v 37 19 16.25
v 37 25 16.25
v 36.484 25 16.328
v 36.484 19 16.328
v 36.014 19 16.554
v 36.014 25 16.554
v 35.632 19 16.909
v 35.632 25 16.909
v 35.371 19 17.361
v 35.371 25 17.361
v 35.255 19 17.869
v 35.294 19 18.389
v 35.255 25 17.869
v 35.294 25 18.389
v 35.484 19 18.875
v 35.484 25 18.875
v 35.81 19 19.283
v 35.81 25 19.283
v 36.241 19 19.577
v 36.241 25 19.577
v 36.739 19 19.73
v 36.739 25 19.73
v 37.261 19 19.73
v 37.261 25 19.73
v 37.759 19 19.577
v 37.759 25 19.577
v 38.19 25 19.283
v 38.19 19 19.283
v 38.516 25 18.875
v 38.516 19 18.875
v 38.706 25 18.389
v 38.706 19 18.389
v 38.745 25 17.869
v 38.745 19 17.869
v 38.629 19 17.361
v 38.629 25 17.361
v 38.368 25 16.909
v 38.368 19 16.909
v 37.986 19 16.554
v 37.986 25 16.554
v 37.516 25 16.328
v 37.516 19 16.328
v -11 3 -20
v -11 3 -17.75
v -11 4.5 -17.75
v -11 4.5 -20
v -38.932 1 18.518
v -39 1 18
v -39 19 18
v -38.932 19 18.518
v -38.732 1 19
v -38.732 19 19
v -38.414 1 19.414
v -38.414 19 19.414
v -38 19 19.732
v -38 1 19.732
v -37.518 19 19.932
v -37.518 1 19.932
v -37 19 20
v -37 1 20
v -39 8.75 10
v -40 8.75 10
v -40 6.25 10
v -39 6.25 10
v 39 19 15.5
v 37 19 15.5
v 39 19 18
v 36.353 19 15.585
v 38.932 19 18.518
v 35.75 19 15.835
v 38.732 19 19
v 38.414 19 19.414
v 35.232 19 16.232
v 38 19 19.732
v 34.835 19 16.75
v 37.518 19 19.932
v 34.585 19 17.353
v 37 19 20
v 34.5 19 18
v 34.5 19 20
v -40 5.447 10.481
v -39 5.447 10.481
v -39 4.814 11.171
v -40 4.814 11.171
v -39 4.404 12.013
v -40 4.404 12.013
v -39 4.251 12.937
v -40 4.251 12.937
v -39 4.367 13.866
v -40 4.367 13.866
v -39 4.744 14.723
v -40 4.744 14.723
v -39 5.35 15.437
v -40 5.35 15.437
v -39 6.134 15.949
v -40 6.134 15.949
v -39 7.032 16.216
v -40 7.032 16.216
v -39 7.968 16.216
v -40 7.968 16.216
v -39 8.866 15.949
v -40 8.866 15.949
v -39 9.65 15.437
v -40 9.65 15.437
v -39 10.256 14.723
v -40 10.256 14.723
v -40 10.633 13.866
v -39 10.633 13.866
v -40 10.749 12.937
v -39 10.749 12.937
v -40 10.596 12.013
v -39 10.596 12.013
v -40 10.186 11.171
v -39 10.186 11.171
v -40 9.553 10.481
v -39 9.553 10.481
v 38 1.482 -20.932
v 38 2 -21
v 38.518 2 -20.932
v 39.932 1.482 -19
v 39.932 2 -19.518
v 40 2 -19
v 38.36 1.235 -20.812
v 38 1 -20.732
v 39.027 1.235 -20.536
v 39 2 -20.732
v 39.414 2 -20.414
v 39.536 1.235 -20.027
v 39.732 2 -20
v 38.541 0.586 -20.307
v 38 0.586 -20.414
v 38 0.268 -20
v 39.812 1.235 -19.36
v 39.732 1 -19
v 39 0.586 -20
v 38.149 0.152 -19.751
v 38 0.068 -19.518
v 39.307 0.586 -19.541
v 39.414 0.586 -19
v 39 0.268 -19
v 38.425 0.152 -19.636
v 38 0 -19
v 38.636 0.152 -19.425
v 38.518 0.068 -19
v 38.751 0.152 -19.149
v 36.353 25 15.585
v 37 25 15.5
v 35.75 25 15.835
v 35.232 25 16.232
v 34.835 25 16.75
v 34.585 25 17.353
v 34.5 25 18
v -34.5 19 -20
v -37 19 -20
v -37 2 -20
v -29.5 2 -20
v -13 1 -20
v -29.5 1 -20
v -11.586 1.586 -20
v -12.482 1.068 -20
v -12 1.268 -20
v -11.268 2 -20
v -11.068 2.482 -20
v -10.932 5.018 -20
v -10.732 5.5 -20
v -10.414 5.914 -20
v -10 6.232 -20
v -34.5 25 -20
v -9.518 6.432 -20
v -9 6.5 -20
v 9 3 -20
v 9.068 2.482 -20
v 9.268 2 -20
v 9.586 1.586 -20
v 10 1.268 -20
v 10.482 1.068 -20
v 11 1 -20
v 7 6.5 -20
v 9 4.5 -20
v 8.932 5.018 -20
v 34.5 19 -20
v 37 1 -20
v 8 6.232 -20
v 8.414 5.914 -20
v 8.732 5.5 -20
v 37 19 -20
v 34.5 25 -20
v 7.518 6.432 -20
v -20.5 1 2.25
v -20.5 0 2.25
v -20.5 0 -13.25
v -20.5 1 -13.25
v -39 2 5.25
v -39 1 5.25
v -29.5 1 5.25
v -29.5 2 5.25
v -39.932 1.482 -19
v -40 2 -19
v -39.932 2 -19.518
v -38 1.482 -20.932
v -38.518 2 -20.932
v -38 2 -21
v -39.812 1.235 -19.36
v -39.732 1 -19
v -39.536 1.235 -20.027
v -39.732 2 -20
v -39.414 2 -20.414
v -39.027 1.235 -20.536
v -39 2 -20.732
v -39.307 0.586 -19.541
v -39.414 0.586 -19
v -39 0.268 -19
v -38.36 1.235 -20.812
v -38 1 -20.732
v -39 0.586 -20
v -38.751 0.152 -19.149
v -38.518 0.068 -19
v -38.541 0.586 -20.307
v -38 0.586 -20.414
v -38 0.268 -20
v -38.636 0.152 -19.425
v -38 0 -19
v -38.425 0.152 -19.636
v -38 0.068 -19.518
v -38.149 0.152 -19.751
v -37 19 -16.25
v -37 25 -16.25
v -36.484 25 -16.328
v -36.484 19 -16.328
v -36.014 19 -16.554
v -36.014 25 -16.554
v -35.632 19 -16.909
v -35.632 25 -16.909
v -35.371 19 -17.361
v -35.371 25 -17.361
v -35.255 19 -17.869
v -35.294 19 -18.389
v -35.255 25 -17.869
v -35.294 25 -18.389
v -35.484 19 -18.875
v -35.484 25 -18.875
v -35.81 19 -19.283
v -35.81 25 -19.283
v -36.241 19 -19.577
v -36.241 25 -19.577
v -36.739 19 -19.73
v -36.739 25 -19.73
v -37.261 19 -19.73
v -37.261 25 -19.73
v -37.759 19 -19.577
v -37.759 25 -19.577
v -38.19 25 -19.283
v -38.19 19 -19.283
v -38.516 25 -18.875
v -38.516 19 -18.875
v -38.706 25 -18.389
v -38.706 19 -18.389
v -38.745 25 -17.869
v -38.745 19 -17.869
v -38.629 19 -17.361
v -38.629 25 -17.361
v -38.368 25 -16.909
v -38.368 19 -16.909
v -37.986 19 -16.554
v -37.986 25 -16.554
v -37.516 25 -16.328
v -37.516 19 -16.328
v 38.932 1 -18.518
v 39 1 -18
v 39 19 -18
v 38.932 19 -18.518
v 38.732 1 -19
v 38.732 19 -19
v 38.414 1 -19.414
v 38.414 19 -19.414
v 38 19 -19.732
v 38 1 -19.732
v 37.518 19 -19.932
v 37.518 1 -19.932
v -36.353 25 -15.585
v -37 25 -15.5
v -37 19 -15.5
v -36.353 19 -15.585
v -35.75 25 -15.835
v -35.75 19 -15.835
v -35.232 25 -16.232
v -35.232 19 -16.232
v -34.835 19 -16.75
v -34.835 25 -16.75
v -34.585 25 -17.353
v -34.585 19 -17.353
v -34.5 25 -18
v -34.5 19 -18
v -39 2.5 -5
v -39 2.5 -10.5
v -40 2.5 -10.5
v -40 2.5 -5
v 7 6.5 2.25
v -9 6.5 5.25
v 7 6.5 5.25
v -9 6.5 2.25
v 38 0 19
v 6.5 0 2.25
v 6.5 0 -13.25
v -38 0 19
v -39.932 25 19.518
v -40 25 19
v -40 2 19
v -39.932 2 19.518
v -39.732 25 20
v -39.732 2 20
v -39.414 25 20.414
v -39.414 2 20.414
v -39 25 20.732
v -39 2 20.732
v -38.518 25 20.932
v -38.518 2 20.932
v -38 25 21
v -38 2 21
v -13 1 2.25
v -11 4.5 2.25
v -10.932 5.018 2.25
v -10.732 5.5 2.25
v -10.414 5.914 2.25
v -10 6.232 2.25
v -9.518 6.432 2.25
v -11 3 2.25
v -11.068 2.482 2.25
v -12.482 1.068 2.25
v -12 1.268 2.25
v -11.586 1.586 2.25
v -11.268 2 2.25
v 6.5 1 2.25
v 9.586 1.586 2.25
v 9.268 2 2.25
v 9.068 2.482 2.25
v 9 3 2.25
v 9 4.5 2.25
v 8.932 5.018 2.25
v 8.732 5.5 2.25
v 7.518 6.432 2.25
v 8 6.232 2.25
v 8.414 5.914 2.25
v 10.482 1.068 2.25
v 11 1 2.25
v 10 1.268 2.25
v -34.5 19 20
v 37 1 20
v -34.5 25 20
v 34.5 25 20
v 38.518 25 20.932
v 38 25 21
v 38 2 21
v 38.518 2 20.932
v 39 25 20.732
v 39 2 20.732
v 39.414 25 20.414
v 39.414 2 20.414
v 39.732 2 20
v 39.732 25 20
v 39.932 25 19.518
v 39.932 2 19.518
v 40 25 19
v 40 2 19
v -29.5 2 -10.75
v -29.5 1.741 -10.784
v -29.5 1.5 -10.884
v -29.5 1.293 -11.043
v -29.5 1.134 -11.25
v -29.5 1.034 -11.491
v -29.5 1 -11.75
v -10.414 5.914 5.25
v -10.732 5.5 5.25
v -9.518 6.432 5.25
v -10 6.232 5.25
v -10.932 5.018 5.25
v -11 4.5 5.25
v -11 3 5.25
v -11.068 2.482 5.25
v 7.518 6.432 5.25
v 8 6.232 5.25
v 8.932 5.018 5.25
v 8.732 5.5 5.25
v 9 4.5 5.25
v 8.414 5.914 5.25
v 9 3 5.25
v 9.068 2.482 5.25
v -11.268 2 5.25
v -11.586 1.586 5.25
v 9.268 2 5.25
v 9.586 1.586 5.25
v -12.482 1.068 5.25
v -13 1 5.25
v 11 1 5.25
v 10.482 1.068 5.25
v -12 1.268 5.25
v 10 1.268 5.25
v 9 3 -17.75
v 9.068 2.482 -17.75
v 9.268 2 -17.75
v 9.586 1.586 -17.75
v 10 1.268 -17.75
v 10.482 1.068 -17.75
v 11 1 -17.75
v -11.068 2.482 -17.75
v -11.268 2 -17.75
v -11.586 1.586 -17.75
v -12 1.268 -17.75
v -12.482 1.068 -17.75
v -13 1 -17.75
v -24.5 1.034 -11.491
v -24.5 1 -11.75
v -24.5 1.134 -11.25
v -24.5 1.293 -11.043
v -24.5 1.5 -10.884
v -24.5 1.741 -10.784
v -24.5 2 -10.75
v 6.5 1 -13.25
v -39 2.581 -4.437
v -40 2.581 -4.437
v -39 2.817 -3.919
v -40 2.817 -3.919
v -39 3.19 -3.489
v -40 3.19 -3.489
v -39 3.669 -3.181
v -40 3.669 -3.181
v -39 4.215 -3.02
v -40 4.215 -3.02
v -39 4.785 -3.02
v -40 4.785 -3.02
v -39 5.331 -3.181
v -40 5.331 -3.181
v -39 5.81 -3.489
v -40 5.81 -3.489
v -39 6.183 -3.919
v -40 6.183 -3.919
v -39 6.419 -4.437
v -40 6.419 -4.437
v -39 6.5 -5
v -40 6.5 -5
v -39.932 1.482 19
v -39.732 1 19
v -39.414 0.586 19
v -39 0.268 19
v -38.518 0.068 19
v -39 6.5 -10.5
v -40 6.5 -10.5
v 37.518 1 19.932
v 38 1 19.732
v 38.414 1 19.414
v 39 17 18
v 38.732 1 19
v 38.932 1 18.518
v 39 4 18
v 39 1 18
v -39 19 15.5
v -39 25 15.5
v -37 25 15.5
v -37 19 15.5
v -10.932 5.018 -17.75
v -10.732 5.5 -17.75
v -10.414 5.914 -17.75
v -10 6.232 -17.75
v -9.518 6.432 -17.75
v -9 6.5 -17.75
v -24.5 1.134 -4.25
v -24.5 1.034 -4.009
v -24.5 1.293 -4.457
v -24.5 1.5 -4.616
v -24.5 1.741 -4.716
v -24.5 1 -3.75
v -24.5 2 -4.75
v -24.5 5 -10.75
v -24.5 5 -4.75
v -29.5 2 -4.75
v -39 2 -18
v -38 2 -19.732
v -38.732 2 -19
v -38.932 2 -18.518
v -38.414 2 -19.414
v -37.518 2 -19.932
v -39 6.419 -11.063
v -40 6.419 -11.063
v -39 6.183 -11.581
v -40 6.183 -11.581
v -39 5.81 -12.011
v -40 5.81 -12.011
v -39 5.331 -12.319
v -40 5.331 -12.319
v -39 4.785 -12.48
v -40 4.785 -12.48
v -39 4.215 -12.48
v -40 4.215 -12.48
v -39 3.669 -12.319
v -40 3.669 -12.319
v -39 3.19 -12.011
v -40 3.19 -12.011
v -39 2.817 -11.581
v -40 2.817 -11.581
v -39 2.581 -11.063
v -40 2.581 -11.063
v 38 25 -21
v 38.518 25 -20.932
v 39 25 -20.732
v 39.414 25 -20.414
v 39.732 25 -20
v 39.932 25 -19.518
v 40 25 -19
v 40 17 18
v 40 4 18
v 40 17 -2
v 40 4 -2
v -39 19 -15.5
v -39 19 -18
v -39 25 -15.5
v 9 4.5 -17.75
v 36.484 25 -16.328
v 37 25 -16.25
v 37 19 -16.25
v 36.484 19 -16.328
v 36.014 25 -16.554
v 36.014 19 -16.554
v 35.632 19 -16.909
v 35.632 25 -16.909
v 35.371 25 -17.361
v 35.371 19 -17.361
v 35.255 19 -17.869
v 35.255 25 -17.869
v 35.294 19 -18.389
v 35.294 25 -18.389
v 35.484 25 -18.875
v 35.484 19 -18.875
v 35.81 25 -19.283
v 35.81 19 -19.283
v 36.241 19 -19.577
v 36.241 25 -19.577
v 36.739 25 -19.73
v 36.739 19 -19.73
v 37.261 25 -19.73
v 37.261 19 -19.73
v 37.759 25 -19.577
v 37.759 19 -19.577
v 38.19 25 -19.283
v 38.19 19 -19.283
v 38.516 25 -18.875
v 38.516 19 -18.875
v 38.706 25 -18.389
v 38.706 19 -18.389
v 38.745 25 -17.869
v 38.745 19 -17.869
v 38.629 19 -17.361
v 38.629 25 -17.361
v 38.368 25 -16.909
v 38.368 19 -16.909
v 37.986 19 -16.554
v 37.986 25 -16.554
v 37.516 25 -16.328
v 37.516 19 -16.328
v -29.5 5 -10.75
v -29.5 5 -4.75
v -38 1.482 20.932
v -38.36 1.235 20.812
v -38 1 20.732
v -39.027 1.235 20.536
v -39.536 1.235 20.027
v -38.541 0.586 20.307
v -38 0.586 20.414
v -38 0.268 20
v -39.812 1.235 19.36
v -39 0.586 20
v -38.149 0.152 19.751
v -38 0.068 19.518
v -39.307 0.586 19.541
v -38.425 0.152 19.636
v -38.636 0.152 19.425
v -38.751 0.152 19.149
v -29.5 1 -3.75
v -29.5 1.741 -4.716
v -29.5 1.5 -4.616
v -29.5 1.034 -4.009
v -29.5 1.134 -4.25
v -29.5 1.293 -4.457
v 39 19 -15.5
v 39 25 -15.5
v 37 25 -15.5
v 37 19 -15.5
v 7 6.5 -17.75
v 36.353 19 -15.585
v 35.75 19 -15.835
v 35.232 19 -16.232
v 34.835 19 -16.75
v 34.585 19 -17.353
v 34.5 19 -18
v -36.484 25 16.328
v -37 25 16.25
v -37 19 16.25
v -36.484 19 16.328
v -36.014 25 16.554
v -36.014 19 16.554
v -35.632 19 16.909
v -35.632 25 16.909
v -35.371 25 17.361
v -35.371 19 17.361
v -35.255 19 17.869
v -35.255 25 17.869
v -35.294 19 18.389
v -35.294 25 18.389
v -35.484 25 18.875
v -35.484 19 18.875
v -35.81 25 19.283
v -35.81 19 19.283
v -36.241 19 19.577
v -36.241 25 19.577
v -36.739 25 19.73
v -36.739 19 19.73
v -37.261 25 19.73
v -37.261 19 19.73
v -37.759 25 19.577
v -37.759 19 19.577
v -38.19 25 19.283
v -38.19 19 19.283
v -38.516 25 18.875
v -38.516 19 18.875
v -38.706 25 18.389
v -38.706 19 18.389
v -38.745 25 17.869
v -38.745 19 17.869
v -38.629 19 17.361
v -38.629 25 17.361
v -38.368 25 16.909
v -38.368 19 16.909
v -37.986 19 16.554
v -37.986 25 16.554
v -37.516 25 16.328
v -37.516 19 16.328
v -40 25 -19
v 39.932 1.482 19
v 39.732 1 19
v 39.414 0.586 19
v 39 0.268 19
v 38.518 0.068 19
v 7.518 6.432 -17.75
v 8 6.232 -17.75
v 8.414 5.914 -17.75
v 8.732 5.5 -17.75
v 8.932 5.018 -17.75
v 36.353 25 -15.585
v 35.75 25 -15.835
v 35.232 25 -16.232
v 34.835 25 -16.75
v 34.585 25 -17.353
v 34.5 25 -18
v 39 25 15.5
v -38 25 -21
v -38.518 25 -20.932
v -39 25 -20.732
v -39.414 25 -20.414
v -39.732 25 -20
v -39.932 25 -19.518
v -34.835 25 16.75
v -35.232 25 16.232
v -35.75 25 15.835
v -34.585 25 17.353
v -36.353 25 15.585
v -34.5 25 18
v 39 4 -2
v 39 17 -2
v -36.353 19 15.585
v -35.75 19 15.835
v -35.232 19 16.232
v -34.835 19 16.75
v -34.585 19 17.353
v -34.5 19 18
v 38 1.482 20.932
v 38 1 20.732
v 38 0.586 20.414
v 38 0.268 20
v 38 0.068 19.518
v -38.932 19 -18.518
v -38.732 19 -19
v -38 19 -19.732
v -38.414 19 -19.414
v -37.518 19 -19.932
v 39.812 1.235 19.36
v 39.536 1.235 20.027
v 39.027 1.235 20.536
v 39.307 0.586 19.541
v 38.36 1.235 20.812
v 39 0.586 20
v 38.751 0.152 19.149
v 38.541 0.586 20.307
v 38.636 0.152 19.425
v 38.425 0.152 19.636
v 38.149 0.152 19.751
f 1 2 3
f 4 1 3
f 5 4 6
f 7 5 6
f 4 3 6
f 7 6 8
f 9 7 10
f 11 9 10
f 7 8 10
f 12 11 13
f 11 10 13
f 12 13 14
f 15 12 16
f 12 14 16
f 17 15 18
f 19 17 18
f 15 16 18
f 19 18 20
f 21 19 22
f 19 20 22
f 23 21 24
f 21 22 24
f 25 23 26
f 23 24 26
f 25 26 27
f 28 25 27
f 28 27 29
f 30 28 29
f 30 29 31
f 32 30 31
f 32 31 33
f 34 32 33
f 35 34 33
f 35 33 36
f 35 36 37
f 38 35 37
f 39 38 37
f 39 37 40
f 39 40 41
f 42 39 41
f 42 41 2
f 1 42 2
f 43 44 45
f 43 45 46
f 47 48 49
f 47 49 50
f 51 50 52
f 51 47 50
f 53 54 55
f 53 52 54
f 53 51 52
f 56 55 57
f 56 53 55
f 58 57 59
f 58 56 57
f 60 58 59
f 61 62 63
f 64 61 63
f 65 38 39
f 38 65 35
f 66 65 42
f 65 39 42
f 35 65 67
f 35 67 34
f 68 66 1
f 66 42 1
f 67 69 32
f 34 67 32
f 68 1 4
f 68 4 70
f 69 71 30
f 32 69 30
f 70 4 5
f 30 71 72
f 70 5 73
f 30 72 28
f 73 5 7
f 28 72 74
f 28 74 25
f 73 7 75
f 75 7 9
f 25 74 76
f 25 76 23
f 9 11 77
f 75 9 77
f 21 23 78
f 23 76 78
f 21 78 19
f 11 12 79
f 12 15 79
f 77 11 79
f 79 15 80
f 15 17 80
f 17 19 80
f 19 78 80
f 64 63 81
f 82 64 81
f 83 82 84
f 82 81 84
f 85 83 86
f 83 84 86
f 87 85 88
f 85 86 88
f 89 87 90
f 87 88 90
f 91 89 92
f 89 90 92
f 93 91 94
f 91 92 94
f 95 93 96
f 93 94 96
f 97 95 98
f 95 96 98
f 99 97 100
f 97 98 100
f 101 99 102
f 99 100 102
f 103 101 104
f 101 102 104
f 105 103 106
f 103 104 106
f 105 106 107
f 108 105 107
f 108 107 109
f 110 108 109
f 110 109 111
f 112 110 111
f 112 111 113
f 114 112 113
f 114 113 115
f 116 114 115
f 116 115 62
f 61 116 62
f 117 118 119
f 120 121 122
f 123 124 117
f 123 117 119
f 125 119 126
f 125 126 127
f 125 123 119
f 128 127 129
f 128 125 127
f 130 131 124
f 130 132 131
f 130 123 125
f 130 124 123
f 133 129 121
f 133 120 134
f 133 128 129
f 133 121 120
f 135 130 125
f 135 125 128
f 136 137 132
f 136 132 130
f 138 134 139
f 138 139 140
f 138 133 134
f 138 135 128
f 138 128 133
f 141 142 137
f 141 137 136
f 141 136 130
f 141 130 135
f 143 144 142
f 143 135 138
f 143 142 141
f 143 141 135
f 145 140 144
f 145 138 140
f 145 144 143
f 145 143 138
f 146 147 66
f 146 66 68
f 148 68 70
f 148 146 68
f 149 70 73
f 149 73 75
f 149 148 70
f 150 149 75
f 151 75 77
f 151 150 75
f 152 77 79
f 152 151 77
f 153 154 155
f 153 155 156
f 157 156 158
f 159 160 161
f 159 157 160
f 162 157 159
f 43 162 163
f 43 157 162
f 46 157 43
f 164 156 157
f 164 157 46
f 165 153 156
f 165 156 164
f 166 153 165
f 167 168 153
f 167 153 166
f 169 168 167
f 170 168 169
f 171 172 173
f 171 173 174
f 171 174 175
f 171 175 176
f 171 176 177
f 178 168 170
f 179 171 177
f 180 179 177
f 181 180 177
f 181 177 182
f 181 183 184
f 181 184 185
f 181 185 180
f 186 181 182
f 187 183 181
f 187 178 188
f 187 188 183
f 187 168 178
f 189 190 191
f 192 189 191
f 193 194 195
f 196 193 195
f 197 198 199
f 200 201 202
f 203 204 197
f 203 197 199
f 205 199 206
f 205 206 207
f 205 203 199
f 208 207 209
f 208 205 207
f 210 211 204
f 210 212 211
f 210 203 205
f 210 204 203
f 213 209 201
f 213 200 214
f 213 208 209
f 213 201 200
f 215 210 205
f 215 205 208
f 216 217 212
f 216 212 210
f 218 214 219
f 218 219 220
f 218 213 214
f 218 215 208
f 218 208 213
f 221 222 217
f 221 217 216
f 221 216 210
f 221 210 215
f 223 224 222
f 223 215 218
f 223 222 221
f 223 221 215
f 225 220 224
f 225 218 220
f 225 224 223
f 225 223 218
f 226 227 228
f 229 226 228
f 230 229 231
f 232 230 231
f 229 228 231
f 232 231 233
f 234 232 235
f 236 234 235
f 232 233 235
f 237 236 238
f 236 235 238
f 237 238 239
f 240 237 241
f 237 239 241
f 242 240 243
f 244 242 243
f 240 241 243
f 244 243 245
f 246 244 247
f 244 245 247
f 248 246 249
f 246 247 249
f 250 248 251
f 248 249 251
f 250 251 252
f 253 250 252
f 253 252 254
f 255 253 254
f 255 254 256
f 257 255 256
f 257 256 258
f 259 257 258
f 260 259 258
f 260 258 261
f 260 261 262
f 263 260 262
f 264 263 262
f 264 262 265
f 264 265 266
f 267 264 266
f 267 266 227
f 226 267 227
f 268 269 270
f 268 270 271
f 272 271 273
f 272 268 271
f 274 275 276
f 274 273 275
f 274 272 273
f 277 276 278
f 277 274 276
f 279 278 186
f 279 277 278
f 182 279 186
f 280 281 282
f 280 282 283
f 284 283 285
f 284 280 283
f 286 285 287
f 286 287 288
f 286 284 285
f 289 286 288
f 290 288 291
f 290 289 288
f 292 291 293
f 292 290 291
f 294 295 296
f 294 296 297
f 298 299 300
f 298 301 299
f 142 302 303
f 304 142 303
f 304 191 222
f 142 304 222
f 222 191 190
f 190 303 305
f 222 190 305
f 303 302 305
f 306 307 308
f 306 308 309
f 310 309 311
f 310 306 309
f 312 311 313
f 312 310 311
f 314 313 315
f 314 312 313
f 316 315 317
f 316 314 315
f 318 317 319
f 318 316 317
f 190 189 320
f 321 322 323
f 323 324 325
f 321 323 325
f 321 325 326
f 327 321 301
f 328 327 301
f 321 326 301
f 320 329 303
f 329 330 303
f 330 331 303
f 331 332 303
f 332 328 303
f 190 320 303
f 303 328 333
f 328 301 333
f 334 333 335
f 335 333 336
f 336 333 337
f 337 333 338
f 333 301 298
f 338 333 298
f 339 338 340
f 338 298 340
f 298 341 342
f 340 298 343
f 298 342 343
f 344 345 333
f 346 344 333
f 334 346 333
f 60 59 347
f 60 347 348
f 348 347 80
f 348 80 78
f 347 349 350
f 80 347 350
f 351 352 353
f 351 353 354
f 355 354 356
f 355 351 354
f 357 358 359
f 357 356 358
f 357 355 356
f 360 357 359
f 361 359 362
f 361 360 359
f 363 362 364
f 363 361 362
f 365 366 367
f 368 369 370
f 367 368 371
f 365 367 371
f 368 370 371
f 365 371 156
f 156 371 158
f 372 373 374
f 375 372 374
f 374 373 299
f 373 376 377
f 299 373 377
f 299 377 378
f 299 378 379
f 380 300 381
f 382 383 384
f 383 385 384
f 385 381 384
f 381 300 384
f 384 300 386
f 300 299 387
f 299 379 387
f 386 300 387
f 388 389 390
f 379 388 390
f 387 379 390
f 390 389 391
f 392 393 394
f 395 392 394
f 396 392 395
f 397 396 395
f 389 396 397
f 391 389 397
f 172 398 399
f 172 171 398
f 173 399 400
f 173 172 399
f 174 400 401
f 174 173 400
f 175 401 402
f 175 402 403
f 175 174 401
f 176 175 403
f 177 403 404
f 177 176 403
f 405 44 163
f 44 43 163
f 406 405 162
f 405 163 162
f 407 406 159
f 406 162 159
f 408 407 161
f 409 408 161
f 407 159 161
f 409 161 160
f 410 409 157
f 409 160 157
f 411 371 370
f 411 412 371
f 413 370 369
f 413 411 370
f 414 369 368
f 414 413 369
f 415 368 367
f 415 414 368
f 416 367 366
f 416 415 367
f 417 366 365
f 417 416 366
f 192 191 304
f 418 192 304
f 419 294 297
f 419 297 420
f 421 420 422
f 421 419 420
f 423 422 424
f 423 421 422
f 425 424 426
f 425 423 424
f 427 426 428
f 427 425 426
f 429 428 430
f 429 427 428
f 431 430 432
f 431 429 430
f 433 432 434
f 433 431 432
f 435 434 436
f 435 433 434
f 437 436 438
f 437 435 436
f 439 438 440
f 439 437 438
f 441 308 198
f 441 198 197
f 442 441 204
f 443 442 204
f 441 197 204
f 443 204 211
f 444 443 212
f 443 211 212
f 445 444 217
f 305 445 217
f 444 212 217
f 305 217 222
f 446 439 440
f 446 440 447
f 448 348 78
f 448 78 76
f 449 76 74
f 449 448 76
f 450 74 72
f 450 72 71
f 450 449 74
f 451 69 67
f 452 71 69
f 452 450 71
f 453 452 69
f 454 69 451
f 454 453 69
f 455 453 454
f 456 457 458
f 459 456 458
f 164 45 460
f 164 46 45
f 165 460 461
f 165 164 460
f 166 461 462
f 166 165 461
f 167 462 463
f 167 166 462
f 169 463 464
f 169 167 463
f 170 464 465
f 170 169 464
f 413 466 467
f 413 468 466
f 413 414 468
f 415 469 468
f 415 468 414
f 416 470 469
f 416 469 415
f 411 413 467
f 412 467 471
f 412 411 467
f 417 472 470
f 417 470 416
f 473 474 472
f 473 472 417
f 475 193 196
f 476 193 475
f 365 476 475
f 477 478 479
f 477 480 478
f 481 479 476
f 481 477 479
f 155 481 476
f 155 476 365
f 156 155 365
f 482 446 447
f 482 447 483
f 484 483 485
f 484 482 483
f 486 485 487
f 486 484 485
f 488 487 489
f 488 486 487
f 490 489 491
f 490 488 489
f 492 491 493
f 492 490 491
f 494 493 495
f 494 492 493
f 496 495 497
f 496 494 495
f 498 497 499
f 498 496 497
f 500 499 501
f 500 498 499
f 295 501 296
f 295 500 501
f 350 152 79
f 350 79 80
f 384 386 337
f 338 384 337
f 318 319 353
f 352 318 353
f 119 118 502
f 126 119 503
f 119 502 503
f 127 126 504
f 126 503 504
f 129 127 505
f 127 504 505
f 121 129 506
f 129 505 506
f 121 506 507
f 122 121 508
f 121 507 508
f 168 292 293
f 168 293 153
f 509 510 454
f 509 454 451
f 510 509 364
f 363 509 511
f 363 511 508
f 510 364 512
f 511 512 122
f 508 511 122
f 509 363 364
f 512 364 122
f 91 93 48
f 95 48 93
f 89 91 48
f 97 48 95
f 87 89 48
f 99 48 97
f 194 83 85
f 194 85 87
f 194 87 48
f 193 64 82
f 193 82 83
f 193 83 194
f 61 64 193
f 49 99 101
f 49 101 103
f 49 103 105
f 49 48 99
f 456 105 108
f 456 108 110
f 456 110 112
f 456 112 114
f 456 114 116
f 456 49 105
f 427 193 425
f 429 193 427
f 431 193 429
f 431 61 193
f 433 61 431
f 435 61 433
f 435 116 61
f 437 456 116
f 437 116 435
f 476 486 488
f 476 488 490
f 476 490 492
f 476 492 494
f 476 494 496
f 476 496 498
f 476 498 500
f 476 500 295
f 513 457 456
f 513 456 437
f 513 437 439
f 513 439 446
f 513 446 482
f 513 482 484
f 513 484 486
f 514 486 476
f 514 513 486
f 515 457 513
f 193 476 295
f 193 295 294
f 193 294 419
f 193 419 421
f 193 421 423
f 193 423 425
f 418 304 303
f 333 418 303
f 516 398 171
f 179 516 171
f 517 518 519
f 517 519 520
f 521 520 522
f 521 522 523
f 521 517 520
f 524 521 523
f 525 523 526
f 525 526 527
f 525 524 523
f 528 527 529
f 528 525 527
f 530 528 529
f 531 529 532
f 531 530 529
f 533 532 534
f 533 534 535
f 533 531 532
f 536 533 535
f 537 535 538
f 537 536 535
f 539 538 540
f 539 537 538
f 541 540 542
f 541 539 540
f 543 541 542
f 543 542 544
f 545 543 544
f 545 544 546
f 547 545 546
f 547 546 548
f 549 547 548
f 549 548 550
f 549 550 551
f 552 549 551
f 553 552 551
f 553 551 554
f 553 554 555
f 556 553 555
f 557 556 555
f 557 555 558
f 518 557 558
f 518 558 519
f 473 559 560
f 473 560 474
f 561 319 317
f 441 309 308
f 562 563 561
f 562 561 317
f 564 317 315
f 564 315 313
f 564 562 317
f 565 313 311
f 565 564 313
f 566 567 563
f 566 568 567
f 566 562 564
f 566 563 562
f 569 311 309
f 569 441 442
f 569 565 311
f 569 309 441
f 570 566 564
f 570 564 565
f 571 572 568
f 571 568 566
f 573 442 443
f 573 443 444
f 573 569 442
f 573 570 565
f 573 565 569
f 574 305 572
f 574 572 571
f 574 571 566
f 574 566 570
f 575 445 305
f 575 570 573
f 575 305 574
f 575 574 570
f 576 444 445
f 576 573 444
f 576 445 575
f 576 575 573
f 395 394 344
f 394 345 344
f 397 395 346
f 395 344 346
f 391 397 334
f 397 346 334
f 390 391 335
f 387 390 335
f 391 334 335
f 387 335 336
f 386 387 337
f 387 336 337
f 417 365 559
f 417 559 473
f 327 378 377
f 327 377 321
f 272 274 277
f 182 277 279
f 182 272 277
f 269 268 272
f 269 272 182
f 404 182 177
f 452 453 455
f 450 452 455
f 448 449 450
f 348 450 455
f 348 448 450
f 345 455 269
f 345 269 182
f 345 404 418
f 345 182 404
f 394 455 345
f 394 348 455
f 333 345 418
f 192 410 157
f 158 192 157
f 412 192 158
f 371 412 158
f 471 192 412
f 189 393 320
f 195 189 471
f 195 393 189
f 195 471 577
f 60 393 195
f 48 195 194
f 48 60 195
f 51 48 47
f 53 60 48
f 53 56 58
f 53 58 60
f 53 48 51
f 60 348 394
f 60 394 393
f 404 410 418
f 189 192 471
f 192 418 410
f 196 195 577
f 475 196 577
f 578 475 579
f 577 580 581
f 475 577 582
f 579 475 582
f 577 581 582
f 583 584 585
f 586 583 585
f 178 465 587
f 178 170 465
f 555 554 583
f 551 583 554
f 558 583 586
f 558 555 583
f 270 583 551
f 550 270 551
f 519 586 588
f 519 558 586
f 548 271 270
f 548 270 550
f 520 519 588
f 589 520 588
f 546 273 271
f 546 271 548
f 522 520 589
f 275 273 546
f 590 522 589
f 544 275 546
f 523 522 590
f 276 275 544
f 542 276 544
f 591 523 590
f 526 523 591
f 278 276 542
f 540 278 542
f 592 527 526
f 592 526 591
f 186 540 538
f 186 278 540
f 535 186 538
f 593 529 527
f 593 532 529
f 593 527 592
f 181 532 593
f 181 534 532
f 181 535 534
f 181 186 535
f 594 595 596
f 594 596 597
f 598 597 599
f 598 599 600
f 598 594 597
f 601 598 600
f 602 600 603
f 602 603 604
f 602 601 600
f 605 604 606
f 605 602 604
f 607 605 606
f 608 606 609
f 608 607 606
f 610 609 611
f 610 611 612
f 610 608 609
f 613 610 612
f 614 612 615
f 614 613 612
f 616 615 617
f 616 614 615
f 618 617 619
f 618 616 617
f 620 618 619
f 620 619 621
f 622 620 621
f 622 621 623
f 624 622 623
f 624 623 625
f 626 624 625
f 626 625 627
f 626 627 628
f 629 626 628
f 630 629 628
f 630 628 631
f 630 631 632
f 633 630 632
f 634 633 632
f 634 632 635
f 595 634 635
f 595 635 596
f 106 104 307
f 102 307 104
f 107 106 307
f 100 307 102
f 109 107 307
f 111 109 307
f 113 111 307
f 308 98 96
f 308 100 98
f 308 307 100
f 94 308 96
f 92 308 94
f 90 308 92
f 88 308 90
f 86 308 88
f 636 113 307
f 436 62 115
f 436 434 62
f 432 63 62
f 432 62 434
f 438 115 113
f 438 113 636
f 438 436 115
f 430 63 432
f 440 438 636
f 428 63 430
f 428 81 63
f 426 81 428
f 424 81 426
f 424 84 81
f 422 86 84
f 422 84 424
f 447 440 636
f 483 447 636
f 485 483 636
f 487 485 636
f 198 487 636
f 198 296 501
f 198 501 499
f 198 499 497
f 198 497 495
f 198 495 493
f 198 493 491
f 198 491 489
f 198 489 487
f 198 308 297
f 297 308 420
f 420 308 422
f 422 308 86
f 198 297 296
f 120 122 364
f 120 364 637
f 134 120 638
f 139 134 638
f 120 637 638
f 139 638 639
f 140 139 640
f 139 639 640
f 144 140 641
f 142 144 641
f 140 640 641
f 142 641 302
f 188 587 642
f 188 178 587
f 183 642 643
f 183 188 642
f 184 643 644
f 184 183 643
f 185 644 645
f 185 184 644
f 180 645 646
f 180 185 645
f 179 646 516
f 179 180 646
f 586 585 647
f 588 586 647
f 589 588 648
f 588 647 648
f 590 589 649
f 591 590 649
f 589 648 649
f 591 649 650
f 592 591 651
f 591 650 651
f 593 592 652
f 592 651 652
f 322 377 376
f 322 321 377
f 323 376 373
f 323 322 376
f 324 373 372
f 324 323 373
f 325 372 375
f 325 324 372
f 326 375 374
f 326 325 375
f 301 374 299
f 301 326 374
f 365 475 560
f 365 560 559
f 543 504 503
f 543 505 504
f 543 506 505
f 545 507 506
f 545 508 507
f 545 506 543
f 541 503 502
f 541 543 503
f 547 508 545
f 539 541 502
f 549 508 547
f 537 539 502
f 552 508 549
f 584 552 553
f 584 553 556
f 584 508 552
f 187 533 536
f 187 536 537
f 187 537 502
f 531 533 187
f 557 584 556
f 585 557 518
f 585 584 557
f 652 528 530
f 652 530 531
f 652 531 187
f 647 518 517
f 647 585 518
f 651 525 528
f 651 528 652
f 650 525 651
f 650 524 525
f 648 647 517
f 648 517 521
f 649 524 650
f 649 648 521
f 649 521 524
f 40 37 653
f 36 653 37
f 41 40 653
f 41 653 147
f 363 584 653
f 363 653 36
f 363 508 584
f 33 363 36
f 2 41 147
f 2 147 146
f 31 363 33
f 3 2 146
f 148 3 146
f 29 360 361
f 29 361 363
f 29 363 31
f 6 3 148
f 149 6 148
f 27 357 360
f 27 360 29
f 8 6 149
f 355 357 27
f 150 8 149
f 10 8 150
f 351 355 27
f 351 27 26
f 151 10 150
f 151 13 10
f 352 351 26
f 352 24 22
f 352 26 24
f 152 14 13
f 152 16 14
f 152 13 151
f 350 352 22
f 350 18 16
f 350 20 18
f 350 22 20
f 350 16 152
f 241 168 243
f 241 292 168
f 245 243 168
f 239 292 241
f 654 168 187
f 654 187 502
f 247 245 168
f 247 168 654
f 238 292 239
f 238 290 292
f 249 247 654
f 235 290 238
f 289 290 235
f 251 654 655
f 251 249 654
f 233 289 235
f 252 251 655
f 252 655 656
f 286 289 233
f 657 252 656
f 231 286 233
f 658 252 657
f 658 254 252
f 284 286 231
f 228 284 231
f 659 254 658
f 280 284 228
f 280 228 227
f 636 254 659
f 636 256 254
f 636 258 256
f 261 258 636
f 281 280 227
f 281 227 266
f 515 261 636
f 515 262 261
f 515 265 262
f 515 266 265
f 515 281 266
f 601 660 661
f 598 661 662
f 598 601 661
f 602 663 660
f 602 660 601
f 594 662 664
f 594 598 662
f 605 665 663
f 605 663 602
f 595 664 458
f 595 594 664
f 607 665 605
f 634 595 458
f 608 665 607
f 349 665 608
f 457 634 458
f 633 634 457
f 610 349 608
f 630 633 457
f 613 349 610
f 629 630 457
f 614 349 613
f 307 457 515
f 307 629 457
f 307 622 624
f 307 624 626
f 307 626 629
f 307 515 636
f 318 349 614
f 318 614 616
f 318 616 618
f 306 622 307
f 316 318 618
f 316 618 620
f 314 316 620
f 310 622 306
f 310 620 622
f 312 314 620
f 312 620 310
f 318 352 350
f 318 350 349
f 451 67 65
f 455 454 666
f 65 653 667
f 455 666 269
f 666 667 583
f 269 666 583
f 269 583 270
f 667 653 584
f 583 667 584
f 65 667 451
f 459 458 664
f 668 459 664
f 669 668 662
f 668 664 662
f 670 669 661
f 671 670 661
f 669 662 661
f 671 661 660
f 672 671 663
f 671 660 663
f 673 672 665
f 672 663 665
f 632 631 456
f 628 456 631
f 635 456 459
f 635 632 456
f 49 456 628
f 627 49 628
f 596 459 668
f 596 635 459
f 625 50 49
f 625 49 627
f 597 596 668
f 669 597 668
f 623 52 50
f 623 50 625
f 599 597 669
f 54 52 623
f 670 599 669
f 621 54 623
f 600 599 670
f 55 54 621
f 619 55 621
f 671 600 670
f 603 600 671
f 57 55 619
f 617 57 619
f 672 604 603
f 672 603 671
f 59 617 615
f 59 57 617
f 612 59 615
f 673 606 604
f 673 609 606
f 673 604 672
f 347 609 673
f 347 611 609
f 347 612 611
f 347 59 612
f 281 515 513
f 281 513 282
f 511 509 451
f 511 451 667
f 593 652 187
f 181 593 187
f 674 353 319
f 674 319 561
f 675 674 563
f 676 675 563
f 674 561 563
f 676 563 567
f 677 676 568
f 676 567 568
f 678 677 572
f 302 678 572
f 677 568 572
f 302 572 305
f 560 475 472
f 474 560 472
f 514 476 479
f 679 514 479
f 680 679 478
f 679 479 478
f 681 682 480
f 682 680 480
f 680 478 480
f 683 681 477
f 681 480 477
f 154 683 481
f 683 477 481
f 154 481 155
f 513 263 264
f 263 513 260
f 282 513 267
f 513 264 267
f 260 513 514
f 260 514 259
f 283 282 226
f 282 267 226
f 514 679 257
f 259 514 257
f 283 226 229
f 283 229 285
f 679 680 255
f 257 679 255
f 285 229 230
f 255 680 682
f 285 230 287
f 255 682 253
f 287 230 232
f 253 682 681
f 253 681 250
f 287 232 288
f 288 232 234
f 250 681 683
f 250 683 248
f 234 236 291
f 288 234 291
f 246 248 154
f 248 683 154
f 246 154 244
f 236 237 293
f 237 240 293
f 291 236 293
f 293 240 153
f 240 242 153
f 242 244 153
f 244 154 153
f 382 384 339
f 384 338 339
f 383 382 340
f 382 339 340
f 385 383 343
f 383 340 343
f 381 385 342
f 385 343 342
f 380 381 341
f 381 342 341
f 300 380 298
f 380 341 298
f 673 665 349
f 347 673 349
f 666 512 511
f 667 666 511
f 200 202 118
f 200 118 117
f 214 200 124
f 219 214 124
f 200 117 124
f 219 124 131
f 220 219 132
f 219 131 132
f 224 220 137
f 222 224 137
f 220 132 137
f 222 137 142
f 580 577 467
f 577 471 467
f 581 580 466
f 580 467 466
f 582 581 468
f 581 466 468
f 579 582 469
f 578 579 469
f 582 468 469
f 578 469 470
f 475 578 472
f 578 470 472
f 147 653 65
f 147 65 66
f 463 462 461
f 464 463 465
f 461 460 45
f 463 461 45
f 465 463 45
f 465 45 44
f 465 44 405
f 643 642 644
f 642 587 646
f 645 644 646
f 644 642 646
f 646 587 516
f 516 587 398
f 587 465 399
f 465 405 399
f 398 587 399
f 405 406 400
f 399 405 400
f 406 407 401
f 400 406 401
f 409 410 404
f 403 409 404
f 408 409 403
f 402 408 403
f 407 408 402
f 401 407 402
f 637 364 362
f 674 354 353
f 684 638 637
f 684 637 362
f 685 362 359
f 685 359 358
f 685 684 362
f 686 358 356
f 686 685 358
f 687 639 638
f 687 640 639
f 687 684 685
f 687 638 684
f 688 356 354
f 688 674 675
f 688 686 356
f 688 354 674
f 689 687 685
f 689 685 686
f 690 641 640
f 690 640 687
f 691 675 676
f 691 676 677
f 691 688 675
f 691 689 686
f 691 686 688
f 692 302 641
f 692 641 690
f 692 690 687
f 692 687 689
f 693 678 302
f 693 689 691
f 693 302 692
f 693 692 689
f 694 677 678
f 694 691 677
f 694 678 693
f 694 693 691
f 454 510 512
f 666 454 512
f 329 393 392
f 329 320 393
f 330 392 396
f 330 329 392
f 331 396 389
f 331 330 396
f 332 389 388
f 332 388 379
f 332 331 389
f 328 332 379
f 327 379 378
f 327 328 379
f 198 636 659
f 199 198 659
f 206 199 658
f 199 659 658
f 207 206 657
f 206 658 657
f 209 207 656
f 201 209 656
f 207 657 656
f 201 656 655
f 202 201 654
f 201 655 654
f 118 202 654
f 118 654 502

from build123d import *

# Parameters (mm, degrees)
SKETCH1_W               = 80
SKETCH1_H               = 42
BOSS_EXTRUDE1_DEPTH     = 25
SKETCH6_W               = 78
SKETCH6_H               = 40
CUT_EXTRUDE6_DEPTH      = 24
CUT_EXTRUDE7_REACH      = 53.157
SKETCH7_W               = 33.5
SKETCH7_H               = 20
SKETCH8_W               = 5
SKETCH8_H               = 6
BOSS_EXTRUDE2_DEPTH     = 4
SKETCH9_W               = 9.5
SKETCH9_H               = 25.25
BOSS_EXTRUDE3_DEPTH     = 1
FILLET1_R               = 1
FILLET3_R               = 2
CUT_EXTRUDE8_REACH      = 87.481
SKETCH18_W              = 20
SKETCH18_H              = 2.25
SKETCH18_H_2            = 3
BOSS_EXTRUDE5_DEPTH     = 5.5
FILLET5_R               = 2
CUT_EXTRUDE12_REACH     = 88.406
BOSS_EXTRUDE6_DEPTH     = 6
CUT_EXTRUDE13_REACH     = 53.633
SKETCH22_R              = 1.75
MIRROR3_COPY_1_DEPTH    = 6
MIRROR3_COPY_2_REACH    = 53.633
MIRROR3_COPY_2_SKETCH_R = 1.75
FILLET6_R               = 2
BOSS_EXTRUDE7_DEPTH     = 1
CUT_EXTRUDE14_REACH     = 88.406
SKETCH24_W              = 20
SKETCH24_H              = 13


with BuildPart() as part:
    # Sketch1 → Boss-Extrude1 (new body)
    with BuildSketch(Plane(origin=(0, 0, 0), x_dir=(1, 0, 0), z_dir=(0, 1, 0))):
        Rectangle(SKETCH1_W, SKETCH1_H)
    extrude(amount=BOSS_EXTRUDE1_DEPTH)

    # Sketch6 → Cut-Extrude6 (cut)
    with BuildSketch(Plane(origin=(0, 25, 0), x_dir=(1, 0, 0), z_dir=(0, 1, 0))):
        Rectangle(SKETCH6_W, SKETCH6_H)
    extrude(amount=-CUT_EXTRUDE6_DEPTH, mode=Mode.SUBTRACT)

    # Sketch7 → Cut-Extrude7 (cut, up to next)
    with BuildSketch(Plane(origin=(0, 1, 0), x_dir=(1, 0, 0), z_dir=(0, 1, 0)), mode=Mode.PRIVATE) as cut_extrude7_sk1:
        with Locations((-7.75, 7.75)):
            Rectangle(SKETCH7_W, SKETCH7_H)
    cut_extrude7_tool1 = extrude(cut_extrude7_sk1.sketch, amount=-CUT_EXTRUDE7_REACH, mode=Mode.PRIVATE) & part.part
    add(cut_extrude7_tool1.solids().sort_by_distance((-7.75, 1, -7.75))[0], mode=Mode.SUBTRACT)

    # Sketch8 → Boss-Extrude2 (add)
    with BuildSketch(Plane(origin=(0, 1, 0), x_dir=(1, 0, 0), z_dir=(0, 1, 0))):
        with Locations((-27, 7.75)):
            Rectangle(SKETCH8_W, SKETCH8_H)
    extrude(amount=BOSS_EXTRUDE2_DEPTH)

    # Sketch9 → Boss-Extrude3 (add)
    with BuildSketch(Plane(origin=(0, 1, 0), x_dir=(1, 0, 0), z_dir=(0, 1, 0))):
        with Locations((-34.25, 7.375)):
            Rectangle(SKETCH9_W, SKETCH9_H)
    extrude(amount=BOSS_EXTRUDE3_DEPTH)

    # Fillet1
    fillet1_edges = [part.edges().sort_by_distance(p)[0] for p in [
        (-27, 1, -10.75),
        (-27, 1, -4.75),
    ]]
    fillet(fillet1_edges, radius=FILLET1_R)

    # Fillet3
    fillet3_edges = [part.edges().sort_by_distance(p)[0] for p in [
        (-39, 13, 20),
        (39, 13, 20),
        (39, 13, -20),
        (-39, 13.5, -20),
        (40, 12.5, 21),
        (-40, 12.5, 21),
        (-40, 12.5, -21),
        (40, 12.5, -21),
    ]]
    fillet(fillet3_edges, radius=FILLET3_R)

    # Sketch12 → Cut-Extrude8 (cut, up to next)
    with BuildSketch(Plane(origin=(-39, 0, 0), x_dir=(0, 0, -1), z_dir=(1, 0, 0)), mode=Mode.PRIVATE) as cut_extrude8_sk1:
        with BuildLine():
            Line((5, 6.5), (10.5, 6.5))
            ThreePointArc((10.5, 6.5), (12.5, 4.5), (10.5, 2.5))
            Line((10.5, 2.5), (5, 2.5))
            ThreePointArc((5, 2.5), (3, 4.5), (5, 6.5))
        make_face()
    cut_extrude8_tool1 = extrude(cut_extrude8_sk1.sketch, amount=-CUT_EXTRUDE8_REACH, mode=Mode.PRIVATE) & part.part
    add(cut_extrude8_tool1.solids().sort_by_distance((-39, 4.5, -7.75))[0], mode=Mode.SUBTRACT)

    # Sketch18 → Boss-Extrude5 (add)
    with BuildSketch(Plane(origin=(0, 1, 0), x_dir=(1, 0, 0), z_dir=(0, 1, 0))):
        with Locations((-1, 18.875)):
            Rectangle(SKETCH18_W, SKETCH18_H)
        with Locations((-1, -3.75)):
            Rectangle(SKETCH18_W, SKETCH18_H_2)
    extrude(amount=BOSS_EXTRUDE5_DEPTH)

    # Fillet5
    fillet5_edges = [part.edges().sort_by_distance(p)[0] for p in [
        (9, 1, -18.875),
        (-11, 1, -18.875),
        (9, 6.5, -18.875),
        (-11, 6.5, -18.875),
        (9, 1, 3.75),
        (-11, 1, 3.75),
        (9, 6.5, 3.75),
        (-11, 6.5, 3.75),
    ]]
    fillet(fillet5_edges, radius=FILLET5_R)

    # Sketch19 → Cut-Extrude12 (cut, up to next)
    with BuildSketch(Plane.ZY.offset(40), mode=Mode.PRIVATE) as cut_extrude12_sk1:
        with BuildLine():
            Line((10, 8.75), (10, 6.25))
            ThreePointArc((10, 6.25), (16.25, 7.5), (10, 8.75))
        make_face()
    cut_extrude12_tool1 = extrude(cut_extrude12_sk1.sketch, amount=-CUT_EXTRUDE12_REACH, mode=Mode.PRIVATE) & part.part
    add(cut_extrude12_tool1.solids().sort_by_distance((-40, 7.5, 13.039742))[0], mode=Mode.SUBTRACT)

    # Sketch20 → Boss-Extrude6 (add)
    with BuildSketch(Plane(origin=(0, 25, 0), x_dir=(1, 0, 0), z_dir=(0, 1, 0))):
        with BuildLine():
            Line((-34.5, 20), (-37, 20))
            ThreePointArc((-37, 20), (-38.414213562, 19.414213562), (-39, 18))
            Line((-39, 18), (-39, 15.5))
            Line((-39, 15.5), (-37, 15.5))
            ThreePointArc((-37, 15.5), (-35.232233047, 16.232233047), (-34.5, 18))
            Line((-34.5, 18), (-34.5, 20))
        make_face()
    boss_extrude6 = extrude(amount=-BOSS_EXTRUDE6_DEPTH)

    # Sketch22 → Cut-Extrude13 (cut, up to next)
    with BuildSketch(Plane(origin=(0, 25, 0), x_dir=(1, 0, 0), z_dir=(0, 1, 0)), mode=Mode.PRIVATE) as cut_extrude13_sk1:
        with Locations(Location((-37, 18, 0), (0, 0, 270))):
            Circle(SKETCH22_R)
    cut_extrude13_tool1 = extrude(cut_extrude13_sk1.sketch, amount=-CUT_EXTRUDE13_REACH, mode=Mode.PRIVATE) & part.part
    cut_extrude13 = cut_extrude13_tool1.solids().sort_by_distance((-37, 25, -18))[0]
    add(cut_extrude13, mode=Mode.SUBTRACT)

    # Mirror1: Boss-Extrude6, Cut-Extrude13 across plane
    add(boss_extrude6.mirror(Plane.XY))
    add(cut_extrude13.mirror(Plane.XY), mode=Mode.SUBTRACT)

    # Mirror3: Boss-Extrude6, Cut-Extrude13 across plane
    add(boss_extrude6.mirror(Plane(origin=(0, 0, 0), x_dir=(0, 0, 1), z_dir=(1, 0, 0))))
    add(cut_extrude13.mirror(Plane(origin=(0, 0, 0), x_dir=(0, 0, 1), z_dir=(1, 0, 0))), mode=Mode.SUBTRACT)

    # Mirror3 copy 1 sketch → Mirror3 copy 1 (add)
    with BuildSketch(Plane(origin=(0, 25, 0), x_dir=(-1, 0, 0), z_dir=(0, 1, 0))):
        with BuildLine():
            Line((-34.5, 20), (-37, 20))
            ThreePointArc((-37, 20), (-38.414213562, 19.414213562), (-39, 18))
            Line((-39, 18), (-39, 15.5))
            Line((-39, 15.5), (-37, 15.5))
            ThreePointArc((-37, 15.5), (-35.232233047, 16.232233047), (-34.5, 18))
            Line((-34.5, 18), (-34.5, 20))
        make_face()
    extrude(amount=-MIRROR3_COPY_1_DEPTH)

    # Mirror3 copy 2 sketch → Mirror3 copy 2 (cut, up to next)
    with BuildSketch(Plane(origin=(0, 25, 0), x_dir=(-1, 0, 0), z_dir=(0, 1, 0)), mode=Mode.PRIVATE) as mirror3_copy_2_sk1:
        with Locations(Location((-37, 18, 0), (0, 0, 270))):
            Circle(MIRROR3_COPY_2_SKETCH_R)
    mirror3_copy_2_tool1 = extrude(mirror3_copy_2_sk1.sketch, amount=-MIRROR3_COPY_2_REACH, mode=Mode.PRIVATE) & part.part
    add(mirror3_copy_2_tool1.solids().sort_by_distance((37, 25, 18))[0], mode=Mode.SUBTRACT)

    # Fillet6
    fillet6_edges = [part.edges().sort_by_distance(p)[0] for p in [
        (0, 0, -21),
        (40, 0, 0),
        (0, 0, 21),
        (-40, 0, 0),
        (39.414213562, 0, 20.414213562),
        (-39.414213562, 0, 20.414213562),
        (-39.414213562, 0, -20.414213562),
        (39.414213562, 0, -20.414213562),
    ]]
    fillet(fillet6_edges, radius=FILLET6_R)

    # Sketch23 → Boss-Extrude7 (add)
    with BuildSketch(Plane.XZ):
        Polygon((-20.5, 2.25), (-20.5, -13.25), (6.5, -13.25), (6.5, 2.25), (9, 2.25), (9, -17.75), (-24.5, -17.75), (-24.5, 2.25), align=None)
    extrude(amount=-BOSS_EXTRUDE7_DEPTH)

    # Sketch24 → Cut-Extrude14 (cut, up to next)
    with BuildSketch(Plane(origin=(40, 0, 0), x_dir=(0, 0, -1), z_dir=(1, 0, 0)), mode=Mode.PRIVATE) as cut_extrude14_sk1:
        with Locations((-8, 10.5)):
            Rectangle(SKETCH24_W, SKETCH24_H)
    cut_extrude14_tool1 = extrude(cut_extrude14_sk1.sketch, amount=-CUT_EXTRUDE14_REACH, mode=Mode.PRIVATE) & part.part
    add(cut_extrude14_tool1.solids().sort_by_distance((40, 10.5, 8))[0], mode=Mode.SUBTRACT)


solid = part.part
